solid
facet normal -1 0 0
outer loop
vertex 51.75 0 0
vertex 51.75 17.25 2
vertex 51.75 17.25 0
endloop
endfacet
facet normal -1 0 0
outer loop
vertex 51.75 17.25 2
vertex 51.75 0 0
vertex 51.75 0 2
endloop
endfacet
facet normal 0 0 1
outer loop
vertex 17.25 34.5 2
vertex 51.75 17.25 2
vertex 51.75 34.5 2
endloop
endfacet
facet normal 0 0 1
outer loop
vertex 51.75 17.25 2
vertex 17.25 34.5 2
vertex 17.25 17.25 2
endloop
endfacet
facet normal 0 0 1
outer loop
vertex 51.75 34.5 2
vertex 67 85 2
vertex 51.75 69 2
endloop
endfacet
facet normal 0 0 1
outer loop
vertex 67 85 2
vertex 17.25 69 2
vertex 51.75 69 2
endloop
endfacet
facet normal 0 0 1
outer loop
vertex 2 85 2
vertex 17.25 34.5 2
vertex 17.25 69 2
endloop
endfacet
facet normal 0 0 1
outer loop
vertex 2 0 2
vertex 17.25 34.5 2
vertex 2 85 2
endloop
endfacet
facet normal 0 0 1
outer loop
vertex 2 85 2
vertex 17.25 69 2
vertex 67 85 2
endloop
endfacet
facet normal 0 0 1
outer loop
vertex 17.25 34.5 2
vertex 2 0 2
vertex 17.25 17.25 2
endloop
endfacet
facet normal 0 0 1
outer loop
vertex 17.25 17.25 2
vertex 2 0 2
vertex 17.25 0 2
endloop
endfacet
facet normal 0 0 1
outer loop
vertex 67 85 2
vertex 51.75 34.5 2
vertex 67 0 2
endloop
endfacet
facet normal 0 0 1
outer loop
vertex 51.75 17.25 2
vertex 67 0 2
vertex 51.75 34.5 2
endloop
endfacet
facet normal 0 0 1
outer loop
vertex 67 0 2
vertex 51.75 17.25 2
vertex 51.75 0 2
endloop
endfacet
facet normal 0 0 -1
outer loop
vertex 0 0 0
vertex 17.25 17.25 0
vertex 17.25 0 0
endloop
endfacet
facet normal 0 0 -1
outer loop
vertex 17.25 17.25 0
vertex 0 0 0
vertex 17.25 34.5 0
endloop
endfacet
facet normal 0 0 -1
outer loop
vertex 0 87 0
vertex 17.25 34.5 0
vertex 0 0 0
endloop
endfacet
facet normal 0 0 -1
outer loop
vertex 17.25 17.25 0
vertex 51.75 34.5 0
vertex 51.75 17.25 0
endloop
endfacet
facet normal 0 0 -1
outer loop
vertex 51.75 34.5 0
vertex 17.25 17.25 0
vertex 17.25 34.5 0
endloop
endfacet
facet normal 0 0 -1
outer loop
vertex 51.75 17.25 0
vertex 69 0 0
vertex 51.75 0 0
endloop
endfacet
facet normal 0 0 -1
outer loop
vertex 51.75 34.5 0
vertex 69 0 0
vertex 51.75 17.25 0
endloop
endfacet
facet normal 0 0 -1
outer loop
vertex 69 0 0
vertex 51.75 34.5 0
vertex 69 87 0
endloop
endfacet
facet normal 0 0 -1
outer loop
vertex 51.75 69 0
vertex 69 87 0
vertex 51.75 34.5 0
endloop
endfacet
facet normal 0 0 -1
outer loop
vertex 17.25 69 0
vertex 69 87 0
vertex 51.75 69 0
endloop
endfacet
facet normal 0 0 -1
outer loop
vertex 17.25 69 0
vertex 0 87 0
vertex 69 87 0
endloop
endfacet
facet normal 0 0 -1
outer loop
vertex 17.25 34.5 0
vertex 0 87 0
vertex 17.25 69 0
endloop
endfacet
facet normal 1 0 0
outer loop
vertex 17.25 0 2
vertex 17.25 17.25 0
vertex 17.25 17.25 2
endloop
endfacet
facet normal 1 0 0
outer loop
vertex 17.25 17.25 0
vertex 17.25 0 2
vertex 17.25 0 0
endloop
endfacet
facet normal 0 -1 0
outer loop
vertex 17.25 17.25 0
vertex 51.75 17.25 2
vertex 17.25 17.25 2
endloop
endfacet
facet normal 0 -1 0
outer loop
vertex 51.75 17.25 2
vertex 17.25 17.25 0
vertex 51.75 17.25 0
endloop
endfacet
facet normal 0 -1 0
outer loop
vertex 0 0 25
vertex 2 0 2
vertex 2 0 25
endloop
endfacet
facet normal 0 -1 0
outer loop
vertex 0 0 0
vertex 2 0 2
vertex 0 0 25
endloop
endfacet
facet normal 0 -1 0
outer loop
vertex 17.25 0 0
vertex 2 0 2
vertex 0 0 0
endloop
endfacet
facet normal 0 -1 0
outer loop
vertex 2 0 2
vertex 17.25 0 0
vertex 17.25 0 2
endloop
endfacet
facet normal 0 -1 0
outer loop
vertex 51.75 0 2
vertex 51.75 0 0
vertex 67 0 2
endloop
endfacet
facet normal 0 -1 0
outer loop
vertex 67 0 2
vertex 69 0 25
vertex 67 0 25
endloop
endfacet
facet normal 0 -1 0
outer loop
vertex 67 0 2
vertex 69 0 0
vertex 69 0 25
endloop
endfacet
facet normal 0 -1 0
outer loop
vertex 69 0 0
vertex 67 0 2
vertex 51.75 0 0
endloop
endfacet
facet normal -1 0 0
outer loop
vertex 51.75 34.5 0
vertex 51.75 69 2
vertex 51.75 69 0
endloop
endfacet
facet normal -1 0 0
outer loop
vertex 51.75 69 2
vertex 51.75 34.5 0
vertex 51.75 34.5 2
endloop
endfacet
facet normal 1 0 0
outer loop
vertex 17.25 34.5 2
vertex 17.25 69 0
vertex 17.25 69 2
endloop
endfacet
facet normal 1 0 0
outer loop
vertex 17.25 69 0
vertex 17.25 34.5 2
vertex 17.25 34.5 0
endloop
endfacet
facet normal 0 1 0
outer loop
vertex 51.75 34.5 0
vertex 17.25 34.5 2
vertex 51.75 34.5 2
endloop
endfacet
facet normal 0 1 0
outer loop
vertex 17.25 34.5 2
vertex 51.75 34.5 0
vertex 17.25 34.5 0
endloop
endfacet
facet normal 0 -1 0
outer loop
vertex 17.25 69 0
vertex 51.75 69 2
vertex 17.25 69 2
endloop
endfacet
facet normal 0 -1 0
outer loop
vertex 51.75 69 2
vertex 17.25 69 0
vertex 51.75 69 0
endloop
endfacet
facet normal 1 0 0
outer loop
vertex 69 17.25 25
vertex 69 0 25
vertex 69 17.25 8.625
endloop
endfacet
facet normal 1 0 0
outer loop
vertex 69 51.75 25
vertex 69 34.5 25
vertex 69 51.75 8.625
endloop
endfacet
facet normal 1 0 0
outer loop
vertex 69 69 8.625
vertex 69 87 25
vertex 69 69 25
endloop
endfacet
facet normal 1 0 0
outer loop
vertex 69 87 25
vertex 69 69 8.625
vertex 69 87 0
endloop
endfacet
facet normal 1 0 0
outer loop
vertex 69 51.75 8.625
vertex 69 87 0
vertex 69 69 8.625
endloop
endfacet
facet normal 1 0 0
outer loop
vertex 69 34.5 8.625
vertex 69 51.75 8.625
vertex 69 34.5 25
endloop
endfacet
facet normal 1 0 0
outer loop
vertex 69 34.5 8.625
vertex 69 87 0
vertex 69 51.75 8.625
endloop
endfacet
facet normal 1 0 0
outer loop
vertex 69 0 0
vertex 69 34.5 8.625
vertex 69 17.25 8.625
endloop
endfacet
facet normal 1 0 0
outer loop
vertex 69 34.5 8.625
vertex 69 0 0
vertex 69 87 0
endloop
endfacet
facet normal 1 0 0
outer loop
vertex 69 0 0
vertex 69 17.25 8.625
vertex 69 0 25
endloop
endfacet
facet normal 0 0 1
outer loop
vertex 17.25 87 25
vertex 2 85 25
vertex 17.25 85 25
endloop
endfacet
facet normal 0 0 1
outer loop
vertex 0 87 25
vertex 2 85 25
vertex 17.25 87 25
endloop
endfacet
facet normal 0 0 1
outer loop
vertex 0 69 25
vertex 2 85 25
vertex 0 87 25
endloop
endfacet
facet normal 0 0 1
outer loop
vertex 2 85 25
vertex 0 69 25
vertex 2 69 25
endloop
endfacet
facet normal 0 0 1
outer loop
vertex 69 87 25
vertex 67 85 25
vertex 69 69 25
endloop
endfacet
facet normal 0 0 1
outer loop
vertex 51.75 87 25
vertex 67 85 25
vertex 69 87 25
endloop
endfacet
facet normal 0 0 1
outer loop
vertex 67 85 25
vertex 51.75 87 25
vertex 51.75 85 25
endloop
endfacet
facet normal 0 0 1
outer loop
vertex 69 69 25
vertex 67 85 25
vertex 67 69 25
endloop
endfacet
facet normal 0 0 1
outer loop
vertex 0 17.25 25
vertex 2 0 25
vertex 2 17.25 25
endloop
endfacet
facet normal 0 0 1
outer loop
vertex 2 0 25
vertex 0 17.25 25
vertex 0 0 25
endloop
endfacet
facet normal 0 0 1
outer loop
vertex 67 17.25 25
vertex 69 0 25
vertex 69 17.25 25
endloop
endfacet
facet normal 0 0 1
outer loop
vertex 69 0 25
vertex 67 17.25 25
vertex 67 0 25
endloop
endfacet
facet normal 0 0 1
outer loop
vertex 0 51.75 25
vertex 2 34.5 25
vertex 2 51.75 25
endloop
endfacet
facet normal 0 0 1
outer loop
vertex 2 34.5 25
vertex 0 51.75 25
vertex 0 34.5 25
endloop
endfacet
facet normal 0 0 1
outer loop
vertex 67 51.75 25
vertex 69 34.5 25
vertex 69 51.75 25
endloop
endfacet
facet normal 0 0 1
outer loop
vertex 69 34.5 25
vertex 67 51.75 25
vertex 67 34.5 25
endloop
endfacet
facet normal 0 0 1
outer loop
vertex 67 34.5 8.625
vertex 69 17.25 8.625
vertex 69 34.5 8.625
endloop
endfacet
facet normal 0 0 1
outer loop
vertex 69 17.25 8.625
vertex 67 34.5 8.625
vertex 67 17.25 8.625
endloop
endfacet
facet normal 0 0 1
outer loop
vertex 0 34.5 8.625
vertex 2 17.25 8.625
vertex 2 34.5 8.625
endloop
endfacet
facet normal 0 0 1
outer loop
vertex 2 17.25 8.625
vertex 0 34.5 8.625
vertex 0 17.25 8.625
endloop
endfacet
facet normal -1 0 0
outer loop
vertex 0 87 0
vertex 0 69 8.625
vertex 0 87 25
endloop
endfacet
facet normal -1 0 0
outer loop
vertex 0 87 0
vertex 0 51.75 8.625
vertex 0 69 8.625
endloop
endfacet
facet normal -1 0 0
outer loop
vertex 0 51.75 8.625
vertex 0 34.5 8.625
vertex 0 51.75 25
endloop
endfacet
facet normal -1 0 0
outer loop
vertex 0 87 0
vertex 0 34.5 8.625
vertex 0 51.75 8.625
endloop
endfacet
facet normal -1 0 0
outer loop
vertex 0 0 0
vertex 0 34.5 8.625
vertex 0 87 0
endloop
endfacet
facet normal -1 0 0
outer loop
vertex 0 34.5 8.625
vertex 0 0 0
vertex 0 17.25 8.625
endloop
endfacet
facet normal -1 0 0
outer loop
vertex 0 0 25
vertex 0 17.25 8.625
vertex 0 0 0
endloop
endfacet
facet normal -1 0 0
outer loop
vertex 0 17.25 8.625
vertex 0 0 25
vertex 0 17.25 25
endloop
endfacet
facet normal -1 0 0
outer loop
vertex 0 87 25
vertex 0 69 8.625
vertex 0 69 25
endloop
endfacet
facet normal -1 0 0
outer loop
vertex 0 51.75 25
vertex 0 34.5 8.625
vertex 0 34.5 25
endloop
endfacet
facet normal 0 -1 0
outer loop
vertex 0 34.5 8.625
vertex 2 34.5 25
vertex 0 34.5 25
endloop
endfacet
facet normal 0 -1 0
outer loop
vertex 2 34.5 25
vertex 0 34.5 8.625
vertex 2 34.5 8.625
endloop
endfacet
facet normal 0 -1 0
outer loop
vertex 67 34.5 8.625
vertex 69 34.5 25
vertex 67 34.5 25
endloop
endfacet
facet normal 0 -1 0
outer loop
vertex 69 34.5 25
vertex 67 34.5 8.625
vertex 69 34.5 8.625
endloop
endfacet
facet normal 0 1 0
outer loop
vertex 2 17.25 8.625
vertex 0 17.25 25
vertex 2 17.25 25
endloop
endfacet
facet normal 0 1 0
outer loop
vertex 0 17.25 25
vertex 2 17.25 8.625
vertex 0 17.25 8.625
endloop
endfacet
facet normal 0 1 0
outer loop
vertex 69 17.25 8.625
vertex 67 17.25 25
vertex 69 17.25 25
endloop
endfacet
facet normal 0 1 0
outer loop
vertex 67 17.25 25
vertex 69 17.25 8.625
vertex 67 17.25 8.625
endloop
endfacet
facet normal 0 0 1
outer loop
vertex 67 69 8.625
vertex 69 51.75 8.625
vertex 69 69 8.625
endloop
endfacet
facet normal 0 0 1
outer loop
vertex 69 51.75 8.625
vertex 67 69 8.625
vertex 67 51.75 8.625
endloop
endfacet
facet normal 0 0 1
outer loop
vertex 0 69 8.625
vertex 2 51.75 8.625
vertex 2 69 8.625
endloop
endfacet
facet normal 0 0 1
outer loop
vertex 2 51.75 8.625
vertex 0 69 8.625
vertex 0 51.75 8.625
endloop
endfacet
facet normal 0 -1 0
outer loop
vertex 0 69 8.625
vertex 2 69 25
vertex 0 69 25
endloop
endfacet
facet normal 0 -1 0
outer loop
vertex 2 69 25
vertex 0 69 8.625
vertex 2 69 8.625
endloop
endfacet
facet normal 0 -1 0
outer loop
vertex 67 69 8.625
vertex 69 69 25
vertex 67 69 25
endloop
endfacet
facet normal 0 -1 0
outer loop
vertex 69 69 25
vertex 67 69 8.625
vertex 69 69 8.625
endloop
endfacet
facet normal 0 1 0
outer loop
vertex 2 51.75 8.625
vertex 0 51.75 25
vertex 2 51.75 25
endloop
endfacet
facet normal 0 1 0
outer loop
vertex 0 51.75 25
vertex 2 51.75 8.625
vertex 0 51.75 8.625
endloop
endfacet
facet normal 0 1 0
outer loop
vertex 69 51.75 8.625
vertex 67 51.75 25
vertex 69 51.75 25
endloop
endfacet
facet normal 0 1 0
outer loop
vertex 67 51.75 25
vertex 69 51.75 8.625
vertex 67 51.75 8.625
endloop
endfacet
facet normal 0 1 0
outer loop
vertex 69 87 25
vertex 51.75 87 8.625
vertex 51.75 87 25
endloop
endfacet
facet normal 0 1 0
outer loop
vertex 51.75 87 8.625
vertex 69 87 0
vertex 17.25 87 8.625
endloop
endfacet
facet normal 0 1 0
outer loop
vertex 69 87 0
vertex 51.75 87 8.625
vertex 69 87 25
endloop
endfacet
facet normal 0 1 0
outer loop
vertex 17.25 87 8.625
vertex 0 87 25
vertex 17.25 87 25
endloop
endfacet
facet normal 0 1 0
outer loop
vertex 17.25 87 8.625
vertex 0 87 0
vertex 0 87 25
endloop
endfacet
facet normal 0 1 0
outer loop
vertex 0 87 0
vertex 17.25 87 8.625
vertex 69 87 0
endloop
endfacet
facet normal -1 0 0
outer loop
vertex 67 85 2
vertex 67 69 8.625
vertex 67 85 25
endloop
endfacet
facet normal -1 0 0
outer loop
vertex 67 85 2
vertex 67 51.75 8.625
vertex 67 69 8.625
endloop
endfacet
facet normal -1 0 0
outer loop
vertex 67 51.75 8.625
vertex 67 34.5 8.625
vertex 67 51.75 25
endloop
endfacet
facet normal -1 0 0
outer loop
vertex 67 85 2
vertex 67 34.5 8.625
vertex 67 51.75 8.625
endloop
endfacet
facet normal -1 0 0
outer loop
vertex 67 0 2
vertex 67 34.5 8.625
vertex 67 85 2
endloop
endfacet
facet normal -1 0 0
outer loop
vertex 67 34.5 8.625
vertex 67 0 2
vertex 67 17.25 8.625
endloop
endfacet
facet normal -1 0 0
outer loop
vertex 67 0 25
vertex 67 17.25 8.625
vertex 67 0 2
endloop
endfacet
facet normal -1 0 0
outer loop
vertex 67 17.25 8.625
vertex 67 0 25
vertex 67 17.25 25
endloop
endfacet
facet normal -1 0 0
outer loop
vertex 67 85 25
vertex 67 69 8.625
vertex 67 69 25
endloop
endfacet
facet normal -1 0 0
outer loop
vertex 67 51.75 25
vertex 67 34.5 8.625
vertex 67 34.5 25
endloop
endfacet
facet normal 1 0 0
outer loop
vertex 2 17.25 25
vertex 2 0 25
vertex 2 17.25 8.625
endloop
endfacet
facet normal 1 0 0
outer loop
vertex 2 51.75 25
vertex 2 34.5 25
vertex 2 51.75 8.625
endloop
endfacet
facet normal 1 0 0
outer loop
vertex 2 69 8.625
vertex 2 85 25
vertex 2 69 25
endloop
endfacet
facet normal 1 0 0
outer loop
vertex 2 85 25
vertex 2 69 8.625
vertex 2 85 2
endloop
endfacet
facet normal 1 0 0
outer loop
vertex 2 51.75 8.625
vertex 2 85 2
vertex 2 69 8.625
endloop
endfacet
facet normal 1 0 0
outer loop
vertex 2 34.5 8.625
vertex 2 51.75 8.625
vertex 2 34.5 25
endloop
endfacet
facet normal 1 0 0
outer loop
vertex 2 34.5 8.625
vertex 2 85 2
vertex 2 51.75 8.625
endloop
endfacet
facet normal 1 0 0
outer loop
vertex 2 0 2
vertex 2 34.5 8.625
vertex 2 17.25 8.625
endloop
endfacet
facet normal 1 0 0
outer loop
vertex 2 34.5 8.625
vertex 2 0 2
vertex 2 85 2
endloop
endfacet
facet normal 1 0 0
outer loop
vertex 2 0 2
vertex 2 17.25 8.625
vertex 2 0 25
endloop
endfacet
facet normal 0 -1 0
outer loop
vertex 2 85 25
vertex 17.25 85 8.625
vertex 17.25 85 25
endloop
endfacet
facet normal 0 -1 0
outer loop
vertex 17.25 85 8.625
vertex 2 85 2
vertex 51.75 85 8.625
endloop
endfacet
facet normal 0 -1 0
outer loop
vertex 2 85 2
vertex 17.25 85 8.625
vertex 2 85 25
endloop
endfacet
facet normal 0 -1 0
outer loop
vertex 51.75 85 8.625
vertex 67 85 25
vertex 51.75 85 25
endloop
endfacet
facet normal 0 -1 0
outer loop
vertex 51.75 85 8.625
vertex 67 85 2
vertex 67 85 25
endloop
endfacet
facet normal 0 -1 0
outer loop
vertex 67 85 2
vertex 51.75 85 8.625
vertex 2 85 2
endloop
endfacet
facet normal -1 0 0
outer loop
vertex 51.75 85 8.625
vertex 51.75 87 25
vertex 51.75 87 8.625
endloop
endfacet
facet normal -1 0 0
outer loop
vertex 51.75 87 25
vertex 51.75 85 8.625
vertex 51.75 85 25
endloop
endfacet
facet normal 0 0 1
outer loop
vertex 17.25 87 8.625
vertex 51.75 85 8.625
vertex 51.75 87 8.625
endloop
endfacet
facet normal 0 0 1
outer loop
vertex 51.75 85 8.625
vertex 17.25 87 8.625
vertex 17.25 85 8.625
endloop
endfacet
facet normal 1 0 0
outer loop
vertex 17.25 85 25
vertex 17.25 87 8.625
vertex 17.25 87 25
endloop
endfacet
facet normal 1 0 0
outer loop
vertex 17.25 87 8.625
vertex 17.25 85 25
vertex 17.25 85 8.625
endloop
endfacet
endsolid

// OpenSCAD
// file: card-holder.scad
module holder(card_width, card_length, deck_thickness) {
    wall_thickness  = 2;
    part_width      = card_width  + (wall_thickness * 2);
    part_length     = card_length +  wall_thickness;
    part_height     = deck_thickness * 1.25;
    slot_width      = part_width / 2;
    slot_offset     = part_width / 4;

    difference() {
        // Create a solid cube.
        cube([part_width, part_length, part_height]);

        // Remove the section the cards actually sit in.
        translate([wall_thickness, -wall_thickness, wall_thickness])
            cube([card_width, part_length, part_height]);

        // Bottom slots.
        for (i=[0,2,3])
            translate([slot_offset, slot_offset * i, 0])
                cube([slot_width, slot_offset, wall_thickness]);
        
        // Side slots.
        for (i=[1,3])
            translate([0, slot_offset * i, slot_offset / 2])
                cube([part_width,
                      slot_offset,
                      part_height - (slot_offset / 2)]);

        // Rear slot.
        translate([slot_offset, part_length - wall_thickness, slot_offset / 2])
            cube([slot_width, wall_thickness, part_height]);
    }
}

// NOTE: render() makes it the preview not look weird, but performs worse.
//render() holder(card_width=65, card_length=85, deck_thickness=20);
// main file
use <card-holder.scad>;

// NOTE: render() makes it the preview not look weird, but performs worse.
render() holder(card_width=65, card_length=85, deck_thickness=20);
